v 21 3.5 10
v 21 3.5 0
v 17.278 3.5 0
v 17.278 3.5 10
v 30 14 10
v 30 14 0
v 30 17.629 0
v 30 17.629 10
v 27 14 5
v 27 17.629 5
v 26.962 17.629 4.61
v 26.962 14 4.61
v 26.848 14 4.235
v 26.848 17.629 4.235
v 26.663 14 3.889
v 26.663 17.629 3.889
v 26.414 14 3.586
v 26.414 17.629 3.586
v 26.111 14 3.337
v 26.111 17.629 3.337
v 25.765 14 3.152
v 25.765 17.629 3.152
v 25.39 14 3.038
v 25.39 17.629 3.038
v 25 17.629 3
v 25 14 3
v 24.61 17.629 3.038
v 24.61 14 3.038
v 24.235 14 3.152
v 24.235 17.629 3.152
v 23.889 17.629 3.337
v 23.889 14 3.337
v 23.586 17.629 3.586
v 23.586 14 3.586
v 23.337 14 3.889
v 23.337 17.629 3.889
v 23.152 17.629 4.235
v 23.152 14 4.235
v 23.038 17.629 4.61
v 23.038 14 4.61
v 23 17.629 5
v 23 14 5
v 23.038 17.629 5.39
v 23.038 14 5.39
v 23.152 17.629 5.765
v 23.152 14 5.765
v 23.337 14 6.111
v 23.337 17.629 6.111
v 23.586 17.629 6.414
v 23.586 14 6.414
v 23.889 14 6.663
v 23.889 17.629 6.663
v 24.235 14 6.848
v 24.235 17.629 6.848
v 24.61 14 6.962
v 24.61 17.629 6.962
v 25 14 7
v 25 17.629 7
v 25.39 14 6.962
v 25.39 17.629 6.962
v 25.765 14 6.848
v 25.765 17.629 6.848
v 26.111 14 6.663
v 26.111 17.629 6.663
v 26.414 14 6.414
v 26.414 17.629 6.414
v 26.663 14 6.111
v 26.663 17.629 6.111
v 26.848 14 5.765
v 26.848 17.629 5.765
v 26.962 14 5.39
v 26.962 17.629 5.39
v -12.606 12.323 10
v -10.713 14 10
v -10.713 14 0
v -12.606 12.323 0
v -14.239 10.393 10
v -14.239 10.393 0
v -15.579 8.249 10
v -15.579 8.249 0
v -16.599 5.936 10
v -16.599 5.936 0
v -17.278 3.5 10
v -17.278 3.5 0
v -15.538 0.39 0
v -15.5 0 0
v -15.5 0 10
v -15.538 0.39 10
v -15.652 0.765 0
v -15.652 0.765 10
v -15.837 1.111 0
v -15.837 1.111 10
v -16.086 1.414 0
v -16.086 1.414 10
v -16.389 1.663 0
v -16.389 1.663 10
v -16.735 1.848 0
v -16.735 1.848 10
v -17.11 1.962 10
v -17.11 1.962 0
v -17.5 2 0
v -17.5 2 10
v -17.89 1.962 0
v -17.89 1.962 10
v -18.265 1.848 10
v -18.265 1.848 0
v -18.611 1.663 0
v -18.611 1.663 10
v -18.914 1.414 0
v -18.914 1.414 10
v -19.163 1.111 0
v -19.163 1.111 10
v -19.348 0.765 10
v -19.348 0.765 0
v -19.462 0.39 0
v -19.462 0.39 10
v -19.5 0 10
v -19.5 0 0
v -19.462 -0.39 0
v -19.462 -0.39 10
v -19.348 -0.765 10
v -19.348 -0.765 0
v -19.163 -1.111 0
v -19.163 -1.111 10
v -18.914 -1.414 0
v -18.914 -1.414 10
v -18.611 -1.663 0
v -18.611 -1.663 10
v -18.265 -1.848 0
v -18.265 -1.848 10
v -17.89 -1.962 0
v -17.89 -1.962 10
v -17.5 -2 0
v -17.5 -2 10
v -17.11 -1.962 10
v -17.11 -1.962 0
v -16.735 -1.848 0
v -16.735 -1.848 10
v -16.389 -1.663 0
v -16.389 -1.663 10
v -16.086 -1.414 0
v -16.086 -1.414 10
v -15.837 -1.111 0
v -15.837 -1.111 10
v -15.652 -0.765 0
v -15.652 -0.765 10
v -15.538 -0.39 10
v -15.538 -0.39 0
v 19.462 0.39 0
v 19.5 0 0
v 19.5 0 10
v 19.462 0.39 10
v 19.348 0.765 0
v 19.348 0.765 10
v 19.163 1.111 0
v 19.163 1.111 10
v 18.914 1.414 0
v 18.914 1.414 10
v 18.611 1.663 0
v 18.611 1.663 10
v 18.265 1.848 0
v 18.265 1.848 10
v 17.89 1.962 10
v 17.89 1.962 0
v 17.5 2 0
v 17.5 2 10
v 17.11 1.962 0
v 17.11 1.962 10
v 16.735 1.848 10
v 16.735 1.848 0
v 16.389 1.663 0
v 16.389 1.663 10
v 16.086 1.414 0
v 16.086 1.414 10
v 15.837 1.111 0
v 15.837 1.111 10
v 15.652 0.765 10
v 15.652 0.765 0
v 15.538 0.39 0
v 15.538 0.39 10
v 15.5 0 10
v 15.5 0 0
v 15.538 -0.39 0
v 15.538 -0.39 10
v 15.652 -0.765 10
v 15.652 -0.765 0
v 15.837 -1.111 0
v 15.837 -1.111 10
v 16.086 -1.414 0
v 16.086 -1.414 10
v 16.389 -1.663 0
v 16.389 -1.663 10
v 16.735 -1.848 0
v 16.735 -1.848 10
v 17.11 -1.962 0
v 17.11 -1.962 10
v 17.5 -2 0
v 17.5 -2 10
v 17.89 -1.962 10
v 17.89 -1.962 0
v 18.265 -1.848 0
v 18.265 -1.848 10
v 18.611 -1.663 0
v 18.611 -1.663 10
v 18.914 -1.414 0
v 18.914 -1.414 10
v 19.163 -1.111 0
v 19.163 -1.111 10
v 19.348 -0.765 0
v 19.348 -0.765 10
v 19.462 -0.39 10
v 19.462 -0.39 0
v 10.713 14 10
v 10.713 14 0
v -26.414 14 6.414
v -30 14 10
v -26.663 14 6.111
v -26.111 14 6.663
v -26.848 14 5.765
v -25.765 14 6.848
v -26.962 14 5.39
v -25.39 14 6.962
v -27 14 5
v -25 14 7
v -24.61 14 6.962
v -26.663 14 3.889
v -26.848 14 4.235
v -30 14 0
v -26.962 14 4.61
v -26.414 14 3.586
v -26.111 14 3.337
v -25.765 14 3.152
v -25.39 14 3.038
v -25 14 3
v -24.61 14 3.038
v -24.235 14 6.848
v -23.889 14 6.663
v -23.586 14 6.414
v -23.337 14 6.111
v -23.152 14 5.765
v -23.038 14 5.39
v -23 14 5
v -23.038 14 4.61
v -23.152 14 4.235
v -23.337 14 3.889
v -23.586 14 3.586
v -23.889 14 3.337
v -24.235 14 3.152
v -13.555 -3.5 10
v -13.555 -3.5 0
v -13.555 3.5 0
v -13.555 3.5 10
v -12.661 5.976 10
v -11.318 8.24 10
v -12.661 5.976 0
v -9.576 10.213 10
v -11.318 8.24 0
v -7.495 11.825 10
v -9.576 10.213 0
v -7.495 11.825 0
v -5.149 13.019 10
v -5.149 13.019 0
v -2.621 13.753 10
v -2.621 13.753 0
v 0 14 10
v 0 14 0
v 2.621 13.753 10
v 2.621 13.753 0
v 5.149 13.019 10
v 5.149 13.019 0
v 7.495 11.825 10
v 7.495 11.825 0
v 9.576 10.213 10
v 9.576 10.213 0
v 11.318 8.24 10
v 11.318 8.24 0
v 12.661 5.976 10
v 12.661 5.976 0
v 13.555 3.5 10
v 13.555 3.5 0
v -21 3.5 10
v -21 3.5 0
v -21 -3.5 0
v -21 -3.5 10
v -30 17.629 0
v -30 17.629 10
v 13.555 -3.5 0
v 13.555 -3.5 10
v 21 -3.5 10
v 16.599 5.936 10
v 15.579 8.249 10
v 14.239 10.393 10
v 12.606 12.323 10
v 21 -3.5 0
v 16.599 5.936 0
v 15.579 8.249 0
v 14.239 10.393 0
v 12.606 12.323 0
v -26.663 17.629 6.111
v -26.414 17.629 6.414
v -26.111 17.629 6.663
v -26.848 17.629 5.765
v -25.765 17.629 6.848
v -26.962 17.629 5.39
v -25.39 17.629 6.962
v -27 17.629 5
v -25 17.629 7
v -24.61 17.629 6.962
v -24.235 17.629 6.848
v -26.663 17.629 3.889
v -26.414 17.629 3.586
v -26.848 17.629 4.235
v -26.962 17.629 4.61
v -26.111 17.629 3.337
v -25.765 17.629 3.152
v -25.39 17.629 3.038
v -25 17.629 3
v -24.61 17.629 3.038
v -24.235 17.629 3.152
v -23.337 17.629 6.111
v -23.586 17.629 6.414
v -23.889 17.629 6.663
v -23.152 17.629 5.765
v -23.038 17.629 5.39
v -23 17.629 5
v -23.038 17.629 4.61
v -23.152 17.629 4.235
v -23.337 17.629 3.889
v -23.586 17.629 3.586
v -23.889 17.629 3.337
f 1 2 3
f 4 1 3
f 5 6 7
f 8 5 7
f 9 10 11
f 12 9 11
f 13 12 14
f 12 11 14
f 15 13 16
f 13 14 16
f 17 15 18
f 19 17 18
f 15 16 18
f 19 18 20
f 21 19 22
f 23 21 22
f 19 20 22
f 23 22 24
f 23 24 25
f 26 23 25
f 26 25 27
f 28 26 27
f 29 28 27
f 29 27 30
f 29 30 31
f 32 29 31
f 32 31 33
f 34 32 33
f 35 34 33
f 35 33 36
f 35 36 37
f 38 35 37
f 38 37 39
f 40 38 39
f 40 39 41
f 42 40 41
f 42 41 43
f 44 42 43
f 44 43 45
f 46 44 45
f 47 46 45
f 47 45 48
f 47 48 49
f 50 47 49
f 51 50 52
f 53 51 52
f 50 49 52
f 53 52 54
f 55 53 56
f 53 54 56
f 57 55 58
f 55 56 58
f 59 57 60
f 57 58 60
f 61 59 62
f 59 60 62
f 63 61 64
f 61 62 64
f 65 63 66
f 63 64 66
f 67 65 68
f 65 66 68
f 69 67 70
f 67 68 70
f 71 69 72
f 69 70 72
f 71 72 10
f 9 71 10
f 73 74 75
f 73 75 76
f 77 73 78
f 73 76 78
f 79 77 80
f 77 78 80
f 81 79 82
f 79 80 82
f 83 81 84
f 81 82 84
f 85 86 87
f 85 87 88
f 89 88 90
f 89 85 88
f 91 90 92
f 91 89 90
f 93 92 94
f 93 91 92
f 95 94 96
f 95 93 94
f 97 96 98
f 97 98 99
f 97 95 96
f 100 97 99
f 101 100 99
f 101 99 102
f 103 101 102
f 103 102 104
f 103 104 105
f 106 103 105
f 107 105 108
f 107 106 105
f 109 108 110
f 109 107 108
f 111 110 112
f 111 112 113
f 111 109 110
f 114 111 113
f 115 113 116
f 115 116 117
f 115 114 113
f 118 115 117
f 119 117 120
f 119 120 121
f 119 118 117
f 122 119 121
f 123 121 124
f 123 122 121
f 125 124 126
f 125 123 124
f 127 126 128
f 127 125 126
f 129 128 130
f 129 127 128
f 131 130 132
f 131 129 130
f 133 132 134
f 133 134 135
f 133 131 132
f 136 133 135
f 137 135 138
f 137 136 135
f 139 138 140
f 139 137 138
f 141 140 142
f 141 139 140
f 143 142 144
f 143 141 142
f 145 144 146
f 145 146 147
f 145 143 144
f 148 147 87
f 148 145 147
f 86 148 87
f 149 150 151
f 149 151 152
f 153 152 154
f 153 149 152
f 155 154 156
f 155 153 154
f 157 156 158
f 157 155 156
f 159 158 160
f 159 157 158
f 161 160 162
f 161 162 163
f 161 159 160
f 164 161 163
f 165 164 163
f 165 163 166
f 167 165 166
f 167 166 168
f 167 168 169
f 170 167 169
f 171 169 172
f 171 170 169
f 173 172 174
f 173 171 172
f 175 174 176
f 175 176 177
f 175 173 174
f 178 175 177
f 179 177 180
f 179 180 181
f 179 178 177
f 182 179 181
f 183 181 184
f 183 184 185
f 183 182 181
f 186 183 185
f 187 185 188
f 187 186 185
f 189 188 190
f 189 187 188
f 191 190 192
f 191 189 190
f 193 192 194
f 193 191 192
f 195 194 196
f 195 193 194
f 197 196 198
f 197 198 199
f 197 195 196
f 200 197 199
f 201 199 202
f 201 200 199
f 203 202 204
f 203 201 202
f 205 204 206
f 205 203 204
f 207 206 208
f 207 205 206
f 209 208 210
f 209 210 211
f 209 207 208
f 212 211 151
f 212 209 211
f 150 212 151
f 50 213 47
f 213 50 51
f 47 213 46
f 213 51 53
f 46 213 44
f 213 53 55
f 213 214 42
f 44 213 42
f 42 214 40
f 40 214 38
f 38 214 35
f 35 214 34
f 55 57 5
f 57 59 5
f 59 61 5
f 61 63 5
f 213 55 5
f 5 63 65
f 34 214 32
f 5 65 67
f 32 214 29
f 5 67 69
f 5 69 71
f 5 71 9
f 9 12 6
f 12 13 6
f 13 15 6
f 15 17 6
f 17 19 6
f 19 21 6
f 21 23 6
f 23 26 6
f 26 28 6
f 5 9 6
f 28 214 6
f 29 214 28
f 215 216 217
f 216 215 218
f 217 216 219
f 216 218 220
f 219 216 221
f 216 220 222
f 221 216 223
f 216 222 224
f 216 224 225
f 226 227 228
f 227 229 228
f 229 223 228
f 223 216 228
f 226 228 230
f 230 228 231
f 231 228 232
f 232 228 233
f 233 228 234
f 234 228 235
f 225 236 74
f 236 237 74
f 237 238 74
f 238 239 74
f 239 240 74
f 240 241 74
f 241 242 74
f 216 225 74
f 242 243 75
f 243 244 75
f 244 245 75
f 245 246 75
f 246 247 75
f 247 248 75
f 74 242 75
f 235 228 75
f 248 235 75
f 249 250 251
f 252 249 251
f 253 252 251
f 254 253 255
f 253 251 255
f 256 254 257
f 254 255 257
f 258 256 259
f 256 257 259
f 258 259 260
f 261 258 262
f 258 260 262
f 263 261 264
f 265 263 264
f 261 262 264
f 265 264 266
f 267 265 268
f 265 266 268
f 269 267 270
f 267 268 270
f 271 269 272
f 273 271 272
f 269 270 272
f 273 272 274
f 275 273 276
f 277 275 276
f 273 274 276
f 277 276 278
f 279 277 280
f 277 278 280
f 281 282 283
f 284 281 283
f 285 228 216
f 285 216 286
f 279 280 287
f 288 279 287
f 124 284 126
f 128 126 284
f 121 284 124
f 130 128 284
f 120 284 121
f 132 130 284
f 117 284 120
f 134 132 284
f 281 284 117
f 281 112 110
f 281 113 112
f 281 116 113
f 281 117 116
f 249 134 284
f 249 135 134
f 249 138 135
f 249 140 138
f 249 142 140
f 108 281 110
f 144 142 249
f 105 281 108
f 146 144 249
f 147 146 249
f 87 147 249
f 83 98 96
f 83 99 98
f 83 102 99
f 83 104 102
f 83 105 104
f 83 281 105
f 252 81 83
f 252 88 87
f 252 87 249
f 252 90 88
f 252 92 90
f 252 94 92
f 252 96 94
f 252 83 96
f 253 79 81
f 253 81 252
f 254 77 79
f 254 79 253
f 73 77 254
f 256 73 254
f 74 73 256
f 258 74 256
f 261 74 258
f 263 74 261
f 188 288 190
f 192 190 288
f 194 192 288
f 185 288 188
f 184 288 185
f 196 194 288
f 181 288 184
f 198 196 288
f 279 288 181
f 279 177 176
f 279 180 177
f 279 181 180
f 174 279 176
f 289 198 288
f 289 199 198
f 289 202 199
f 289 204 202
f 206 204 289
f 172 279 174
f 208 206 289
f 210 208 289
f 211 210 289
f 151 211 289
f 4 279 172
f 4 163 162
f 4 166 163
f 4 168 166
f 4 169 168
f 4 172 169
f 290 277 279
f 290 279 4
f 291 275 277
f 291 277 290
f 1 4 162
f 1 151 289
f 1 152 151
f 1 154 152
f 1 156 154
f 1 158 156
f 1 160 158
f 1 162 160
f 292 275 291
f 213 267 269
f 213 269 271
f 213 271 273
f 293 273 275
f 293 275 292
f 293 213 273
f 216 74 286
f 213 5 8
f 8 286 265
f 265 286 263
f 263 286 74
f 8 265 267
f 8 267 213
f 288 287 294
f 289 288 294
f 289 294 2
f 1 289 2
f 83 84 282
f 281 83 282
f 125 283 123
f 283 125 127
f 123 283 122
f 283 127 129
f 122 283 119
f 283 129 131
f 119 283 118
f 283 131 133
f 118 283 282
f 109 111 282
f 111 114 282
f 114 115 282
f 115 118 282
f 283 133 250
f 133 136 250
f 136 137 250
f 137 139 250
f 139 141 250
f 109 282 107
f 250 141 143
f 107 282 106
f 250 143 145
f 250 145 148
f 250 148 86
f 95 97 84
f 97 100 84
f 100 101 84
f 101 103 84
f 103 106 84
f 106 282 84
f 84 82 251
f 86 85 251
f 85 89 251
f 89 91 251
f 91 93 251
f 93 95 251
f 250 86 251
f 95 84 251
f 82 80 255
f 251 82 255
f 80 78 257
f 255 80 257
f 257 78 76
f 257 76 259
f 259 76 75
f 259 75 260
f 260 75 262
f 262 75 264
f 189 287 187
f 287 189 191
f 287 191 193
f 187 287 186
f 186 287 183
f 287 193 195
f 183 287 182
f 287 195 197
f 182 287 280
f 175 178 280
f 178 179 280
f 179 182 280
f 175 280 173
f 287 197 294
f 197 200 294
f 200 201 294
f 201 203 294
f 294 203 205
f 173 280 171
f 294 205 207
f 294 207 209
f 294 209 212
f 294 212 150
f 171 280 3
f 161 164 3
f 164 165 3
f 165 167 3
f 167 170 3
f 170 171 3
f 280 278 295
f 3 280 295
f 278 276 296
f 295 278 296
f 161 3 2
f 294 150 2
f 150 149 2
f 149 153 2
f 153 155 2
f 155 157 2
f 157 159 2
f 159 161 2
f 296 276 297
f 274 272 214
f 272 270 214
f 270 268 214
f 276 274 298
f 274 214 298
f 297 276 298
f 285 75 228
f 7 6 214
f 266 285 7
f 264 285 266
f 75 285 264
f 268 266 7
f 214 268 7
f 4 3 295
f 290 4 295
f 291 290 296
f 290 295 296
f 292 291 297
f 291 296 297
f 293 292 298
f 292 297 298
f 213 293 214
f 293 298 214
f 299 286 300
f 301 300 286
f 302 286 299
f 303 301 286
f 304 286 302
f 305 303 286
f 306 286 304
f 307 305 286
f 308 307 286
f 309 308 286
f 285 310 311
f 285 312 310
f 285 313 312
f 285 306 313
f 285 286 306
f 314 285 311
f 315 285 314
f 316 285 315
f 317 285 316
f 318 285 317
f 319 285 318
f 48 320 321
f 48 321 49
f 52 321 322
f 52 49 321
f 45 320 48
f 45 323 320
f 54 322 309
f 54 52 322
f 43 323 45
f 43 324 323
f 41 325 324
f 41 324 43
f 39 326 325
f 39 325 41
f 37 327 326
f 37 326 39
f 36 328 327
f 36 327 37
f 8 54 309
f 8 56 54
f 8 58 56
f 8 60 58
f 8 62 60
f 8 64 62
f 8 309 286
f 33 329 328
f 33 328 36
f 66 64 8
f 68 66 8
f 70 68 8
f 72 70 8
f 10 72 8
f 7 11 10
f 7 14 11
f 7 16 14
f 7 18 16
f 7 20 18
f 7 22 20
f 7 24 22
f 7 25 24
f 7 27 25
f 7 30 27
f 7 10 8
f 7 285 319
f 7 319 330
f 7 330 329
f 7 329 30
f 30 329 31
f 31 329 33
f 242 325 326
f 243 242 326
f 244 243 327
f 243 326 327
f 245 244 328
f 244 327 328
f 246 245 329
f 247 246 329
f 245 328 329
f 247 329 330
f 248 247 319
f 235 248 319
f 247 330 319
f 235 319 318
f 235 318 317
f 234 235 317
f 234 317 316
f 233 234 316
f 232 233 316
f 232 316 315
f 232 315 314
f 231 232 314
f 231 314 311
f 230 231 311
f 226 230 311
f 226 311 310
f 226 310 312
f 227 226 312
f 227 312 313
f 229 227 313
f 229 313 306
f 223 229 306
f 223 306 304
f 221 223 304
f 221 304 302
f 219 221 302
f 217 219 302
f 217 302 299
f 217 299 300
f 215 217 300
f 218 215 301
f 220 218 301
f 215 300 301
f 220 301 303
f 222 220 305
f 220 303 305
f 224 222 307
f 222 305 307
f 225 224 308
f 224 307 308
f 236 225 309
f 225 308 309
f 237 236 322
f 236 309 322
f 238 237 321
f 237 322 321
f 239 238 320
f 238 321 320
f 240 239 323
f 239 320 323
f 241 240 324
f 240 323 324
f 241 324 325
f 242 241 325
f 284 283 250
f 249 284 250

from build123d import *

# Parameters (mm, degrees)
ESQUISSE1_R             = 2
BOSS_EXTRU_1_DEPTH      = 10
ESQUISSE3_W             = 60
ESQUISSE3_H             = 3.628659563
BOSS_EXTRU_2_DEPTH      = 10
ENL_V_MAT_EXTRU_1_REACH = 23.129
ESQUISSE4_R             = 2


with BuildPart() as part:
    # Esquisse1 → Boss.-Extru.1 (new body)
    with BuildSketch(Plane.XY):
        with BuildLine():
            Line((-21, 3.5), (-21, -3.5))
            Line((-21, -3.5), (-13.555441712, -3.5))
            Line((-13.555441712, -3.5), (-13.555441712, 3.5))
            ThreePointArc((-13.555441712, 3.5), (0, 14), (13.555441712, 3.5))
            Line((13.555441712, 3.5), (13.555441712, -3.5))
            Line((13.555441712, -3.5), (21, -3.5))
            Line((21, -3.5), (21, 3.5))
            Line((21, 3.5), (17.277720856, 3.5))
            ThreePointArc((17.277720856, 3.5), (0, 17.628659563), (-17.277720856, 3.5))
            Line((-17.277720856, 3.5), (-21, 3.5))
        make_face()
        with Locations((-17.5, 0)):
            Circle(ESQUISSE1_R, mode=Mode.SUBTRACT)
        with Locations((17.5, 0)):
            Circle(ESQUISSE1_R, mode=Mode.SUBTRACT)
    extrude(amount=BOSS_EXTRU_1_DEPTH)

    # Esquisse3 → Boss.-Extru.2 (add)
    with BuildSketch(Plane.XY):
        with Locations((0, 15.814329781)):
            Rectangle(ESQUISSE3_W, ESQUISSE3_H)
    extrude(amount=BOSS_EXTRU_2_DEPTH)

    # Esquisse4 → Enlèv. mat.-Extru.1 (cut, up to next)
    with BuildSketch(Plane(origin=(0, 17.628659563, 0), x_dir=(1, 0, 0), z_dir=(0, 1, 0)), mode=Mode.PRIVATE) as enl_v_mat_extru_1_sk1:
        with Locations((-25, -5)):
            Circle(ESQUISSE4_R)
    enl_v_mat_extru_1_tool1 = extrude(enl_v_mat_extru_1_sk1.sketch, amount=-ENL_V_MAT_EXTRU_1_REACH, mode=Mode.PRIVATE) & part.part
    add(enl_v_mat_extru_1_tool1.solids().sort_by_distance((-25, 17.62866, 5))[0], mode=Mode.SUBTRACT)
    # Esquisse4 → Enlèv. mat.-Extru.1 (cut, up to next)
    with BuildSketch(Plane(origin=(0, 17.628659563, 0), x_dir=(1, 0, 0), z_dir=(0, 1, 0)), mode=Mode.PRIVATE) as enl_v_mat_extru_1_sk2:
        with Locations((25, -5)):
            Circle(ESQUISSE4_R)
    enl_v_mat_extru_1_tool2 = extrude(enl_v_mat_extru_1_sk2.sketch, amount=-ENL_V_MAT_EXTRU_1_REACH, mode=Mode.PRIVATE) & part.part
    add(enl_v_mat_extru_1_tool2.solids().sort_by_distance((25, 17.62866, 5))[0], mode=Mode.SUBTRACT)


solid = part.part
